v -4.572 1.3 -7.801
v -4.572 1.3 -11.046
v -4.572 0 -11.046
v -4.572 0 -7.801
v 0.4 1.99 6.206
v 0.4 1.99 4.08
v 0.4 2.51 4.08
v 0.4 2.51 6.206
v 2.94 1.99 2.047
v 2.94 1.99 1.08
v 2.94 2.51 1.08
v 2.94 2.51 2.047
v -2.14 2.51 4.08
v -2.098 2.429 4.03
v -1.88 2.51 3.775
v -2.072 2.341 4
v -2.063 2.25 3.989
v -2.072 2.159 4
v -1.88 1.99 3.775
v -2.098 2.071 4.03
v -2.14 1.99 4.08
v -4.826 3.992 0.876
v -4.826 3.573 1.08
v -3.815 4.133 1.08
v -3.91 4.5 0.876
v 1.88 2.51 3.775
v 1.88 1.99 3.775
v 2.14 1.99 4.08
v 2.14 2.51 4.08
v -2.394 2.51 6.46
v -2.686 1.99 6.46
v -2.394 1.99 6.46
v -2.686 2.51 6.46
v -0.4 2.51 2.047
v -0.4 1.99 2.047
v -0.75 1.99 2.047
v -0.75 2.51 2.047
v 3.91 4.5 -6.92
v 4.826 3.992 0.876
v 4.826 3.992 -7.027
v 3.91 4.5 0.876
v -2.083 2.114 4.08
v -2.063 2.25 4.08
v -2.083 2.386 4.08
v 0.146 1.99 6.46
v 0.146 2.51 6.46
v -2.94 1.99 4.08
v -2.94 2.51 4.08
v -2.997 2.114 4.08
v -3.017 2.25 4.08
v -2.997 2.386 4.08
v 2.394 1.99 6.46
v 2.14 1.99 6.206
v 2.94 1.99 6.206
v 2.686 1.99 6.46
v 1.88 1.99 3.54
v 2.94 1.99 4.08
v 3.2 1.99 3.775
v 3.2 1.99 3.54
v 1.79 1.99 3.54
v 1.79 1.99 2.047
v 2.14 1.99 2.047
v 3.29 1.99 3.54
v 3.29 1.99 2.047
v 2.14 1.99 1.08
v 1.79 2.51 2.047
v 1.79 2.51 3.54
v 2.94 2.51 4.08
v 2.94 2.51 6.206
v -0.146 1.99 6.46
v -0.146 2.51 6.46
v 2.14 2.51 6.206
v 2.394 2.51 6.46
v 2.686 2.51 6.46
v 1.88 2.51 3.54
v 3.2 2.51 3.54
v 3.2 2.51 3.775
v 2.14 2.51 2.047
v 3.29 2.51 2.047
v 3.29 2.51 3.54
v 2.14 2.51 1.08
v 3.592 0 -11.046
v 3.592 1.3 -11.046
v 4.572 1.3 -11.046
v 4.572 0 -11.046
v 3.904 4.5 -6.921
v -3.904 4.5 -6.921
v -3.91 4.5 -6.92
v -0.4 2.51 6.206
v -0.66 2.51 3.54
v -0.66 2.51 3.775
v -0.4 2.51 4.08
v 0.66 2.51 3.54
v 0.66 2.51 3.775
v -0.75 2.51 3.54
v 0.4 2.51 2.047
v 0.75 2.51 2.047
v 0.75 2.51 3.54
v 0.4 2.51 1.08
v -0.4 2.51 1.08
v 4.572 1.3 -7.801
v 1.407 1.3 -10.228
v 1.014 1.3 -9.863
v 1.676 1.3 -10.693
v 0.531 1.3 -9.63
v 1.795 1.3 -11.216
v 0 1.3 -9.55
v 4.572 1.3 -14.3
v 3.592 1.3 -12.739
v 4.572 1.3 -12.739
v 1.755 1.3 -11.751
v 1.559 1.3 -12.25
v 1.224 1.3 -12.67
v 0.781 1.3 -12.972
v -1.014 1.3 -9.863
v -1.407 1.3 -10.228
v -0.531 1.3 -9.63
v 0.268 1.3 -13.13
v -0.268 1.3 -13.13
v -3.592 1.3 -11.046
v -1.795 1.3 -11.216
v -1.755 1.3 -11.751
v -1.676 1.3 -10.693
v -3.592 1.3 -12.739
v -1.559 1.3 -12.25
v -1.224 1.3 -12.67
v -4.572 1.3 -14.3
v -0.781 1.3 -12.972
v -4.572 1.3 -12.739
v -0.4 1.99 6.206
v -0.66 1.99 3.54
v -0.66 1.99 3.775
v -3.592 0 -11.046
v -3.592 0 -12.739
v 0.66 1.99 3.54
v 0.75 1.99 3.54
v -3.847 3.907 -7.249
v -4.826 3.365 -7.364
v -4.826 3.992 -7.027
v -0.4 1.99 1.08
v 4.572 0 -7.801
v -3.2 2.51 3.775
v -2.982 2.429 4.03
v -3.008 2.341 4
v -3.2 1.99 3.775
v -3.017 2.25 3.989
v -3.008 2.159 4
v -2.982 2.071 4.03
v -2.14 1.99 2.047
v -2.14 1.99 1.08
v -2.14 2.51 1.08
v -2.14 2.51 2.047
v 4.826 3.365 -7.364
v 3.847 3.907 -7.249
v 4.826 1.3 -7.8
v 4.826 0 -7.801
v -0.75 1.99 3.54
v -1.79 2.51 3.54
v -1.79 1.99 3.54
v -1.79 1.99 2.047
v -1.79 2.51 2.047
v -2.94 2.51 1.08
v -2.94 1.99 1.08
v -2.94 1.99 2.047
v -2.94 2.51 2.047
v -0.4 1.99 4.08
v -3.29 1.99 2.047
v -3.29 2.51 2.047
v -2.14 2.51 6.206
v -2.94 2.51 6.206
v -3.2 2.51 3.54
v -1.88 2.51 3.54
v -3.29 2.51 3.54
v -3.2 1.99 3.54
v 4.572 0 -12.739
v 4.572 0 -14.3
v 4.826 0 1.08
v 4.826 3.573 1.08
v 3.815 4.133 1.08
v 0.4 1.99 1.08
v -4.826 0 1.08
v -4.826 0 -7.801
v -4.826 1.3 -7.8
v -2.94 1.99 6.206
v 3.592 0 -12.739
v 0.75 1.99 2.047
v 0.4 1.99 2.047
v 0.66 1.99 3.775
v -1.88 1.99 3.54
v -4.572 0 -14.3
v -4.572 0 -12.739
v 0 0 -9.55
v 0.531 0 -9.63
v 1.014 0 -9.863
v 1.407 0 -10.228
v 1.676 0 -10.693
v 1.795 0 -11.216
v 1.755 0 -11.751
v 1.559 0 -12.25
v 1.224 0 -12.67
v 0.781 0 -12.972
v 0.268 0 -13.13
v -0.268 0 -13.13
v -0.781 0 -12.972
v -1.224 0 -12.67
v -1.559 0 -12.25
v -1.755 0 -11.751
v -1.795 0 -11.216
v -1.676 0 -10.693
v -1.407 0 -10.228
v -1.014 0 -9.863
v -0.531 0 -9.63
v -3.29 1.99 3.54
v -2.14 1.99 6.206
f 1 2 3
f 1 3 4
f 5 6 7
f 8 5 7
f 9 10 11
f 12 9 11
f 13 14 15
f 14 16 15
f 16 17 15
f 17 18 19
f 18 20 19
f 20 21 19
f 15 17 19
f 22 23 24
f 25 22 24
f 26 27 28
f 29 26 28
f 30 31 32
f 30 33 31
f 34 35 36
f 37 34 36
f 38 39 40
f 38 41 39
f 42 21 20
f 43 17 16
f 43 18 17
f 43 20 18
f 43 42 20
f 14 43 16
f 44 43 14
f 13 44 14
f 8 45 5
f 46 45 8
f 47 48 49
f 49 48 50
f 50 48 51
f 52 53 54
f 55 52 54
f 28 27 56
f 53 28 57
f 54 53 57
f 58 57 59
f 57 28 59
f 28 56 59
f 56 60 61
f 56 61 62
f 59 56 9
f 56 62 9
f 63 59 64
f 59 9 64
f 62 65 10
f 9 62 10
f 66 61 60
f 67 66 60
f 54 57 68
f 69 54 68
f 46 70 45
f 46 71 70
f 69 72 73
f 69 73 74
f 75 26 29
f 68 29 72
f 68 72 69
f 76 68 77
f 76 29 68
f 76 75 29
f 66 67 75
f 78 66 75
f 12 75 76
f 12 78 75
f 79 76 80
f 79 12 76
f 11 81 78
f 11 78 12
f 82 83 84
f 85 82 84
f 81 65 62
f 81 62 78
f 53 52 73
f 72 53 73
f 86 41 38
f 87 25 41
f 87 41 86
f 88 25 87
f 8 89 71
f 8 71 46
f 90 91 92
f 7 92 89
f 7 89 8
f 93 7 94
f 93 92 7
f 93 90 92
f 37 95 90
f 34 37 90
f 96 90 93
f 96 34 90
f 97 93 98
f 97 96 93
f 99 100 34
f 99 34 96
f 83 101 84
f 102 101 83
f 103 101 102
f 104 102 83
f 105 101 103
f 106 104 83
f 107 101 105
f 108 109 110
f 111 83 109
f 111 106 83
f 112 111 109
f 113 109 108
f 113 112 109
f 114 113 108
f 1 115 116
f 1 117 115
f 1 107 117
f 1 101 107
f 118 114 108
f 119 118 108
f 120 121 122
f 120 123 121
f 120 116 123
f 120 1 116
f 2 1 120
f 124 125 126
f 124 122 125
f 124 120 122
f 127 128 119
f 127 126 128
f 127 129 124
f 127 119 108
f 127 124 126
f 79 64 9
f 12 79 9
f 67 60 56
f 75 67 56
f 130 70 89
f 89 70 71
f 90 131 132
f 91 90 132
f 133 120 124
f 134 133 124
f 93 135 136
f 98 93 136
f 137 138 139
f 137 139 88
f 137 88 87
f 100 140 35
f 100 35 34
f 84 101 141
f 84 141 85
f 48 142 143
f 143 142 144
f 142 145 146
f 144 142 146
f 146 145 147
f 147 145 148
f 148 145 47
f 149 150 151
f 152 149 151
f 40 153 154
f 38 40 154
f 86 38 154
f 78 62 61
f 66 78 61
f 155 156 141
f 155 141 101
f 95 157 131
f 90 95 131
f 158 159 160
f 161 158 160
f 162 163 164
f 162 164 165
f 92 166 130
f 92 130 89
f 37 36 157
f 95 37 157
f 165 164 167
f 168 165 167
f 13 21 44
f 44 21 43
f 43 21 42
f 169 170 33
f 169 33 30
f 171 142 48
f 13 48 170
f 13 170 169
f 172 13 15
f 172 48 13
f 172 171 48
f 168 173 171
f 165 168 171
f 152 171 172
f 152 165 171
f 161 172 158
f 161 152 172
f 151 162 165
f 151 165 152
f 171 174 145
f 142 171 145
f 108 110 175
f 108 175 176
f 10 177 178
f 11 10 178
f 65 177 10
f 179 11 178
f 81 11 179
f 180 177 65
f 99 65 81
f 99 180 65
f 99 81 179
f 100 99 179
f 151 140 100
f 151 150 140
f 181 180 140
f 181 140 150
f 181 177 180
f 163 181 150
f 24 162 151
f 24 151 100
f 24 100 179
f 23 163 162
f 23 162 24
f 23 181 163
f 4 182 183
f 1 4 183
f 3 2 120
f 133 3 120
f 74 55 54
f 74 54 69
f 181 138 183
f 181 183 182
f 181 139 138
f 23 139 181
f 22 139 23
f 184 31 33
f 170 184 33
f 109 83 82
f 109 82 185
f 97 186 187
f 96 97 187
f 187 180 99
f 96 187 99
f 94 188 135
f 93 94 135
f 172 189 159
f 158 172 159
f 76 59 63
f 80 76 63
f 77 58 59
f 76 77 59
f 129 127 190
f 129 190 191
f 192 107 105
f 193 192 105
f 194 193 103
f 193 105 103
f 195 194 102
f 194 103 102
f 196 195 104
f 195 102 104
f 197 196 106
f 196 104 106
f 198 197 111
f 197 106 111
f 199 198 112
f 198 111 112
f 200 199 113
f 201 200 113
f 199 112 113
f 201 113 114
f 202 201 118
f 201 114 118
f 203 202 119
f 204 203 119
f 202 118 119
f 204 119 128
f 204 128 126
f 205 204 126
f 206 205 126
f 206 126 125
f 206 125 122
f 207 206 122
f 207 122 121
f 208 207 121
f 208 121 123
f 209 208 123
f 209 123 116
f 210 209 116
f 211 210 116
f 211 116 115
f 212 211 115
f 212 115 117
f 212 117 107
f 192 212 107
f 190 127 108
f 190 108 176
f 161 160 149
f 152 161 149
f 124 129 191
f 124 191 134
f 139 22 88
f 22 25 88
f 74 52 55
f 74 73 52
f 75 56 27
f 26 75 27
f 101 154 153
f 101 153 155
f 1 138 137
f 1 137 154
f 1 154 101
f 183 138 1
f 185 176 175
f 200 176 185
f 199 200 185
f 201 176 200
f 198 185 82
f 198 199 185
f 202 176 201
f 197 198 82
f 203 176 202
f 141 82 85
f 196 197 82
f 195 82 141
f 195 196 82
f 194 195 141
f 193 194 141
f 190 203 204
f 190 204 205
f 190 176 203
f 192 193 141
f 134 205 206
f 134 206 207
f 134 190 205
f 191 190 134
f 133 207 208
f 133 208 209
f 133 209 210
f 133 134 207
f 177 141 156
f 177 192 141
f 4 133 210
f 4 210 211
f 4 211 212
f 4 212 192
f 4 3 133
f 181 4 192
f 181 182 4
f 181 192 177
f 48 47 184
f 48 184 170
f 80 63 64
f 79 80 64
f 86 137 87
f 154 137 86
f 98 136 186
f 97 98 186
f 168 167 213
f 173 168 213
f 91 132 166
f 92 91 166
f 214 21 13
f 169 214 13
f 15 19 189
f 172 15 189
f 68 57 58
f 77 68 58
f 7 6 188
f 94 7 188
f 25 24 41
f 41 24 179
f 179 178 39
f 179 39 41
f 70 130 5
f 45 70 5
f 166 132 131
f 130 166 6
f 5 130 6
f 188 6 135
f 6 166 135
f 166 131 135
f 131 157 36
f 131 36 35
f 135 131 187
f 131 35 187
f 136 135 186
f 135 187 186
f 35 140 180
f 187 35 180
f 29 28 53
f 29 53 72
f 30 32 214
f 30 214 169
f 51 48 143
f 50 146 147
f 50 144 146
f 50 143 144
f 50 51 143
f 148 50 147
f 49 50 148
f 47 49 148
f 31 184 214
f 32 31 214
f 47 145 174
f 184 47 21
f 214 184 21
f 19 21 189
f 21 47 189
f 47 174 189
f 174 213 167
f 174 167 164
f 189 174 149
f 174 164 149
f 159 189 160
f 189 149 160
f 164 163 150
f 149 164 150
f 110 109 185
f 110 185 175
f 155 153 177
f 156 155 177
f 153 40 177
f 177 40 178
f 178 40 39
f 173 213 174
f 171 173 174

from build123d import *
from OCP.BRepFilletAPI import BRepFilletAPI_MakeChamfer

# Parameters (mm, degrees)
EXTRUDE1_DEPTH      = 4.826
EXTRUDE1_DEPTH_BACK = 4.826
SKETCH10_R          = 1.8
SKETCH10_W          = 1.233836604
SKETCH10_H          = 1.6931216
EXTRUDE5_DEPTH      = 16.428369203
SKETCH6_W           = 0.8
SKETCH6_H           = 0.52
EXTRUDE6_DEPTH      = 5.38
EXTRUDE7_START      = -0.52
EXTRUDE7_DEPTH      = 0.52
CHAMFER1_SIZE       = 0.254
SKETCH12_W          = 7.379682426
SKETCH12_H          = 2.736118788
EXTRUDE8_DEPTH      = 0.254
SKETCH13_W          = 7.379682426
SKETCH13_H          = 2.736118788
EXTRUDE9_DEPTH      = 0.254
CHAMFER2_SIZE       = 0.508
CHAMFER2_SIZE2      = 0.91645626
CHAMFER3_SIZE       = 0.2032
CHAMFER3_SIZE2      = 0.366582504
CHAMFER3_SIZE2_2    = 0.605677555
CHAMFER3_SIZE2_3    = 0.557834937
EXTRUDE10_DEPTH     = 1.016


with BuildPart() as part:
    # Sketch2 → Extrude1 (new, two sides: drawn at the far end of the back side and taken through both)
    with BuildSketch(Plane(origin=(0, 0, 0), x_dir=(0, 0, -1), z_dir=(1, 0, 0)).offset(-EXTRUDE1_DEPTH_BACK)):
        Polygon((14.3005, 0), (-1.0795, 0), (-1.0795, 4.5), (7.124012877, 4.5), (7.8005, 1.3), (14.3005, 1.3), align=None)
    extrude(amount=EXTRUDE1_DEPTH + EXTRUDE1_DEPTH_BACK)

    # Sketch10 → Extrude5 (cut, through all)
    with BuildSketch(Plane(origin=(0, 1.3, 0), x_dir=(1, 0, 0), z_dir=(0, 1, 0))):
        with Locations(Location((0, 11.3505, 0), (0, 0, 270))):
            Circle(SKETCH10_R)
        with Locations((-4.209081698, 11.892729701)):
            Rectangle(SKETCH10_W, SKETCH10_H)
        with Locations((4.209081698, 11.892729701)):
            Rectangle(SKETCH10_W, SKETCH10_H)
    extrude(amount=-EXTRUDE5_DEPTH, mode=Mode.SUBTRACT)

    # Sketch6 → Extrude6 (add)
    with BuildSketch(Plane.XY.offset(1.0795)):
        with Locations((2.54, 2.25)):
            Rectangle(SKETCH6_W, SKETCH6_H)
        with Locations((-2.54, 2.25)):
            Rectangle(SKETCH6_W, SKETCH6_H)
        with Locations((0, 2.25)):
            Rectangle(SKETCH6_W, SKETCH6_H)
    extrude(amount=EXTRUDE6_DEPTH)

    # Sketch11 → Extrude7 (add)
    with BuildSketch(Plane(origin=(0, 2.51, 0), x_dir=(1, 0, 0), z_dir=(0, 1, 0)).offset(EXTRUDE7_START)):
        Polygon((-2.94, -2.0475), (-3.29, -2.0475), (-3.29, -3.5395), (-3.2004, -3.5395), (-3.2004, -3.7747), (-2.94, -4.0795), align=None)
        Polygon((-1.79, -2.0475), (-2.14, -2.0475), (-2.14, -4.0795), (-1.8796, -3.7747), (-1.8796, -3.5395), (-1.79, -3.5395), align=None)
        Polygon((-0.4, -2.0475), (-0.75, -2.0475), (-0.75, -3.5395), (-0.6604, -3.5395), (-0.6604, -3.7747), (-0.4, -4.0795), align=None)
        Polygon((0.75, -2.0475), (0.4, -2.0475), (0.4, -4.0795), (0.6604, -3.7747), (0.6604, -3.5395), (0.75, -3.5395), align=None)
        Polygon((2.14, -2.0475), (1.79, -2.0475), (1.79, -3.5395), (1.8796, -3.5395), (1.8796, -3.7747), (2.14, -4.0795), align=None)
        Polygon((3.29, -2.0475), (2.94, -2.0475), (2.94, -4.0795), (3.2004, -3.7747), (3.2004, -3.5395), (3.29, -3.5395), align=None)
    extrude(amount=EXTRUDE7_DEPTH)

    # Chamfer1
    chamfer1_edges = [part.edges().sort_by_distance(p)[0] for p in [
        (-2.14, 2.25, 6.4595),
        (-2.94, 2.25, 6.4595),
        (2.94, 2.25, 6.4595),
        (2.14, 2.25, 6.4595),
        (0.4, 2.25, 6.4595),
        (-0.4, 2.25, 6.4595),
    ]]
    chamfer(chamfer1_edges, length=CHAMFER1_SIZE)

    # Sketch12 → Extrude8 (cut)
    with BuildSketch(Plane.ZY.offset(4.826)):
        with Locations((-11.490341213, 1.368059394)):
            Rectangle(SKETCH12_W, SKETCH12_H)
    extrude(amount=-EXTRUDE8_DEPTH, mode=Mode.SUBTRACT)

    # Sketch13 → Extrude9 (cut)
    with BuildSketch(Plane(origin=(4.826, 0, 0), x_dir=(0, 0, -1), z_dir=(1, 0, 0))):
        with Locations((11.490341213, 1.368059394)):
            Rectangle(SKETCH13_W, SKETCH13_H)
    extrude(amount=-EXTRUDE9_DEPTH, mode=Mode.SUBTRACT)

    # Chamfer2: one chamfer whose edges measure the first distance from different faces: ONE call of the kernel's chamfer builder (chamfer() names one face for all edges)
    chamfer2_edges_1 = [part.edges().sort_by_distance(p)[0] for p in [
        (-4.826, 4.5, -3.022256439),
    ]]
    chamfer2_side_1 = [part.faces().sort_by_distance(p)[0] for p in [
        (-4.826, 2.217055195, -3.243165334),
    ]]
    chamfer2_edges_2 = [part.edges().sort_by_distance(p)[0] for p in [
        (4.826, 4.5, -3.022256439),
    ]]
    chamfer2_side_2 = [part.faces().sort_by_distance(p)[0] for p in [
        (4.826, 2.217055195, -3.243165334),
    ]]
    chamfer2 = BRepFilletAPI_MakeChamfer(part.part.solid().wrapped)
    for e in chamfer2_edges_1:
        chamfer2.Add(CHAMFER2_SIZE, CHAMFER2_SIZE2, e.wrapped, chamfer2_side_1[0].wrapped)  # the first distance lies on this face
    for e in chamfer2_edges_2:
        chamfer2.Add(CHAMFER2_SIZE, CHAMFER2_SIZE2, e.wrapped, chamfer2_side_2[0].wrapped)  # the first distance lies on this face
    add(Compound.cast(chamfer2.Shape()), mode=Mode.REPLACE)

    # Chamfer3: one chamfer whose edges measure the first distance from different faces: ONE call of the kernel's chamfer builder (chamfer() names one face for all edges)
    chamfer3_edges_1 = [part.edges().sort_by_distance(p)[0] for p in [
        (0, 4.5, 1.0795),
    ]]
    chamfer3_side_1 = [part.faces().sort_by_distance(p)[0] for p in [
        (0, 4.5, -3.022256439),
    ]]
    chamfer3_edges_2 = [part.edges().sort_by_distance(p)[0] for p in [
        (-4.36777187, 4.246, 1.0795),
    ]]
    chamfer3_side_2 = [part.faces().sort_by_distance(p)[0] for p in [
        (-4.368765147, 4.245449417, -3.049162718),
    ]]
    chamfer3_edges_3 = [part.edges().sort_by_distance(p)[0] for p in [
        (4.36777187, 4.246, 1.0795),
    ]]
    chamfer3_side_3 = [part.faces().sort_by_distance(p)[0] for p in [
        (4.368765147, 4.245449417, -3.049162718),
    ]]
    chamfer3_edges_4 = [part.edges().sort_by_distance(p)[0] for p in [
        (0, 4.5, -7.124012877),
    ]]
    chamfer3_side_4 = [part.faces().sort_by_distance(p)[0] for p in [
        (0, 4.5, -3.022256439),
    ]]
    chamfer3_edges_5 = [part.edges().sort_by_distance(p)[0] for p in [
        (-4.36777187, 4.246, -7.177709043),
    ]]
    chamfer3_side_5 = [part.faces().sort_by_distance(p)[0] for p in [
        (-4.368765147, 4.245449417, -3.049162718),
    ]]
    chamfer3_edges_6 = [part.edges().sort_by_distance(p)[0] for p in [
        (4.36777187, 4.246, -7.177709043),
    ]]
    chamfer3_side_6 = [part.faces().sort_by_distance(p)[0] for p in [
        (4.368765147, 4.245449417, -3.049162718),
    ]]
    chamfer3 = BRepFilletAPI_MakeChamfer(part.part.solid().wrapped)
    for e in chamfer3_edges_1:
        chamfer3.Add(CHAMFER3_SIZE, CHAMFER3_SIZE2, e.wrapped, chamfer3_side_1[0].wrapped)  # the first distance lies on this face
    for e in chamfer3_edges_2:
        chamfer3.Add(CHAMFER3_SIZE, CHAMFER3_SIZE2, e.wrapped, chamfer3_side_2[0].wrapped)  # the first distance lies on this face
    for e in chamfer3_edges_3:
        chamfer3.Add(CHAMFER3_SIZE, CHAMFER3_SIZE2, e.wrapped, chamfer3_side_3[0].wrapped)  # the first distance lies on this face
    for e in chamfer3_edges_4:
        chamfer3.Add(CHAMFER3_SIZE, CHAMFER3_SIZE2_2, e.wrapped, chamfer3_side_4[0].wrapped)  # the first distance lies on this face
    for e in chamfer3_edges_5:
        chamfer3.Add(CHAMFER3_SIZE, CHAMFER3_SIZE2_3, e.wrapped, chamfer3_side_5[0].wrapped)  # the first distance lies on this face
    for e in chamfer3_edges_6:
        chamfer3.Add(CHAMFER3_SIZE, CHAMFER3_SIZE2_3, e.wrapped, chamfer3_side_6[0].wrapped)  # the first distance lies on this face
    add(Compound.cast(chamfer3.Shape()), mode=Mode.REPLACE)

    # Sketch15 → Extrude10 (add)
    with BuildSketch(Plane.XY.offset(4.0795)):
        with BuildLine():
            Line((-2.14, 2.51), (-2.94, 2.51))
            ThreePointArc((-2.94, 2.51), (-3.017074418, 2.25), (-2.94, 1.99))
            Line((-2.94, 1.99), (-2.14, 1.99))
            ThreePointArc((-2.14, 1.99), (-2.062925582, 2.25), (-2.14, 2.51))
        make_face()
    extrude(amount=-EXTRUDE10_DEPTH)


solid = part.part
